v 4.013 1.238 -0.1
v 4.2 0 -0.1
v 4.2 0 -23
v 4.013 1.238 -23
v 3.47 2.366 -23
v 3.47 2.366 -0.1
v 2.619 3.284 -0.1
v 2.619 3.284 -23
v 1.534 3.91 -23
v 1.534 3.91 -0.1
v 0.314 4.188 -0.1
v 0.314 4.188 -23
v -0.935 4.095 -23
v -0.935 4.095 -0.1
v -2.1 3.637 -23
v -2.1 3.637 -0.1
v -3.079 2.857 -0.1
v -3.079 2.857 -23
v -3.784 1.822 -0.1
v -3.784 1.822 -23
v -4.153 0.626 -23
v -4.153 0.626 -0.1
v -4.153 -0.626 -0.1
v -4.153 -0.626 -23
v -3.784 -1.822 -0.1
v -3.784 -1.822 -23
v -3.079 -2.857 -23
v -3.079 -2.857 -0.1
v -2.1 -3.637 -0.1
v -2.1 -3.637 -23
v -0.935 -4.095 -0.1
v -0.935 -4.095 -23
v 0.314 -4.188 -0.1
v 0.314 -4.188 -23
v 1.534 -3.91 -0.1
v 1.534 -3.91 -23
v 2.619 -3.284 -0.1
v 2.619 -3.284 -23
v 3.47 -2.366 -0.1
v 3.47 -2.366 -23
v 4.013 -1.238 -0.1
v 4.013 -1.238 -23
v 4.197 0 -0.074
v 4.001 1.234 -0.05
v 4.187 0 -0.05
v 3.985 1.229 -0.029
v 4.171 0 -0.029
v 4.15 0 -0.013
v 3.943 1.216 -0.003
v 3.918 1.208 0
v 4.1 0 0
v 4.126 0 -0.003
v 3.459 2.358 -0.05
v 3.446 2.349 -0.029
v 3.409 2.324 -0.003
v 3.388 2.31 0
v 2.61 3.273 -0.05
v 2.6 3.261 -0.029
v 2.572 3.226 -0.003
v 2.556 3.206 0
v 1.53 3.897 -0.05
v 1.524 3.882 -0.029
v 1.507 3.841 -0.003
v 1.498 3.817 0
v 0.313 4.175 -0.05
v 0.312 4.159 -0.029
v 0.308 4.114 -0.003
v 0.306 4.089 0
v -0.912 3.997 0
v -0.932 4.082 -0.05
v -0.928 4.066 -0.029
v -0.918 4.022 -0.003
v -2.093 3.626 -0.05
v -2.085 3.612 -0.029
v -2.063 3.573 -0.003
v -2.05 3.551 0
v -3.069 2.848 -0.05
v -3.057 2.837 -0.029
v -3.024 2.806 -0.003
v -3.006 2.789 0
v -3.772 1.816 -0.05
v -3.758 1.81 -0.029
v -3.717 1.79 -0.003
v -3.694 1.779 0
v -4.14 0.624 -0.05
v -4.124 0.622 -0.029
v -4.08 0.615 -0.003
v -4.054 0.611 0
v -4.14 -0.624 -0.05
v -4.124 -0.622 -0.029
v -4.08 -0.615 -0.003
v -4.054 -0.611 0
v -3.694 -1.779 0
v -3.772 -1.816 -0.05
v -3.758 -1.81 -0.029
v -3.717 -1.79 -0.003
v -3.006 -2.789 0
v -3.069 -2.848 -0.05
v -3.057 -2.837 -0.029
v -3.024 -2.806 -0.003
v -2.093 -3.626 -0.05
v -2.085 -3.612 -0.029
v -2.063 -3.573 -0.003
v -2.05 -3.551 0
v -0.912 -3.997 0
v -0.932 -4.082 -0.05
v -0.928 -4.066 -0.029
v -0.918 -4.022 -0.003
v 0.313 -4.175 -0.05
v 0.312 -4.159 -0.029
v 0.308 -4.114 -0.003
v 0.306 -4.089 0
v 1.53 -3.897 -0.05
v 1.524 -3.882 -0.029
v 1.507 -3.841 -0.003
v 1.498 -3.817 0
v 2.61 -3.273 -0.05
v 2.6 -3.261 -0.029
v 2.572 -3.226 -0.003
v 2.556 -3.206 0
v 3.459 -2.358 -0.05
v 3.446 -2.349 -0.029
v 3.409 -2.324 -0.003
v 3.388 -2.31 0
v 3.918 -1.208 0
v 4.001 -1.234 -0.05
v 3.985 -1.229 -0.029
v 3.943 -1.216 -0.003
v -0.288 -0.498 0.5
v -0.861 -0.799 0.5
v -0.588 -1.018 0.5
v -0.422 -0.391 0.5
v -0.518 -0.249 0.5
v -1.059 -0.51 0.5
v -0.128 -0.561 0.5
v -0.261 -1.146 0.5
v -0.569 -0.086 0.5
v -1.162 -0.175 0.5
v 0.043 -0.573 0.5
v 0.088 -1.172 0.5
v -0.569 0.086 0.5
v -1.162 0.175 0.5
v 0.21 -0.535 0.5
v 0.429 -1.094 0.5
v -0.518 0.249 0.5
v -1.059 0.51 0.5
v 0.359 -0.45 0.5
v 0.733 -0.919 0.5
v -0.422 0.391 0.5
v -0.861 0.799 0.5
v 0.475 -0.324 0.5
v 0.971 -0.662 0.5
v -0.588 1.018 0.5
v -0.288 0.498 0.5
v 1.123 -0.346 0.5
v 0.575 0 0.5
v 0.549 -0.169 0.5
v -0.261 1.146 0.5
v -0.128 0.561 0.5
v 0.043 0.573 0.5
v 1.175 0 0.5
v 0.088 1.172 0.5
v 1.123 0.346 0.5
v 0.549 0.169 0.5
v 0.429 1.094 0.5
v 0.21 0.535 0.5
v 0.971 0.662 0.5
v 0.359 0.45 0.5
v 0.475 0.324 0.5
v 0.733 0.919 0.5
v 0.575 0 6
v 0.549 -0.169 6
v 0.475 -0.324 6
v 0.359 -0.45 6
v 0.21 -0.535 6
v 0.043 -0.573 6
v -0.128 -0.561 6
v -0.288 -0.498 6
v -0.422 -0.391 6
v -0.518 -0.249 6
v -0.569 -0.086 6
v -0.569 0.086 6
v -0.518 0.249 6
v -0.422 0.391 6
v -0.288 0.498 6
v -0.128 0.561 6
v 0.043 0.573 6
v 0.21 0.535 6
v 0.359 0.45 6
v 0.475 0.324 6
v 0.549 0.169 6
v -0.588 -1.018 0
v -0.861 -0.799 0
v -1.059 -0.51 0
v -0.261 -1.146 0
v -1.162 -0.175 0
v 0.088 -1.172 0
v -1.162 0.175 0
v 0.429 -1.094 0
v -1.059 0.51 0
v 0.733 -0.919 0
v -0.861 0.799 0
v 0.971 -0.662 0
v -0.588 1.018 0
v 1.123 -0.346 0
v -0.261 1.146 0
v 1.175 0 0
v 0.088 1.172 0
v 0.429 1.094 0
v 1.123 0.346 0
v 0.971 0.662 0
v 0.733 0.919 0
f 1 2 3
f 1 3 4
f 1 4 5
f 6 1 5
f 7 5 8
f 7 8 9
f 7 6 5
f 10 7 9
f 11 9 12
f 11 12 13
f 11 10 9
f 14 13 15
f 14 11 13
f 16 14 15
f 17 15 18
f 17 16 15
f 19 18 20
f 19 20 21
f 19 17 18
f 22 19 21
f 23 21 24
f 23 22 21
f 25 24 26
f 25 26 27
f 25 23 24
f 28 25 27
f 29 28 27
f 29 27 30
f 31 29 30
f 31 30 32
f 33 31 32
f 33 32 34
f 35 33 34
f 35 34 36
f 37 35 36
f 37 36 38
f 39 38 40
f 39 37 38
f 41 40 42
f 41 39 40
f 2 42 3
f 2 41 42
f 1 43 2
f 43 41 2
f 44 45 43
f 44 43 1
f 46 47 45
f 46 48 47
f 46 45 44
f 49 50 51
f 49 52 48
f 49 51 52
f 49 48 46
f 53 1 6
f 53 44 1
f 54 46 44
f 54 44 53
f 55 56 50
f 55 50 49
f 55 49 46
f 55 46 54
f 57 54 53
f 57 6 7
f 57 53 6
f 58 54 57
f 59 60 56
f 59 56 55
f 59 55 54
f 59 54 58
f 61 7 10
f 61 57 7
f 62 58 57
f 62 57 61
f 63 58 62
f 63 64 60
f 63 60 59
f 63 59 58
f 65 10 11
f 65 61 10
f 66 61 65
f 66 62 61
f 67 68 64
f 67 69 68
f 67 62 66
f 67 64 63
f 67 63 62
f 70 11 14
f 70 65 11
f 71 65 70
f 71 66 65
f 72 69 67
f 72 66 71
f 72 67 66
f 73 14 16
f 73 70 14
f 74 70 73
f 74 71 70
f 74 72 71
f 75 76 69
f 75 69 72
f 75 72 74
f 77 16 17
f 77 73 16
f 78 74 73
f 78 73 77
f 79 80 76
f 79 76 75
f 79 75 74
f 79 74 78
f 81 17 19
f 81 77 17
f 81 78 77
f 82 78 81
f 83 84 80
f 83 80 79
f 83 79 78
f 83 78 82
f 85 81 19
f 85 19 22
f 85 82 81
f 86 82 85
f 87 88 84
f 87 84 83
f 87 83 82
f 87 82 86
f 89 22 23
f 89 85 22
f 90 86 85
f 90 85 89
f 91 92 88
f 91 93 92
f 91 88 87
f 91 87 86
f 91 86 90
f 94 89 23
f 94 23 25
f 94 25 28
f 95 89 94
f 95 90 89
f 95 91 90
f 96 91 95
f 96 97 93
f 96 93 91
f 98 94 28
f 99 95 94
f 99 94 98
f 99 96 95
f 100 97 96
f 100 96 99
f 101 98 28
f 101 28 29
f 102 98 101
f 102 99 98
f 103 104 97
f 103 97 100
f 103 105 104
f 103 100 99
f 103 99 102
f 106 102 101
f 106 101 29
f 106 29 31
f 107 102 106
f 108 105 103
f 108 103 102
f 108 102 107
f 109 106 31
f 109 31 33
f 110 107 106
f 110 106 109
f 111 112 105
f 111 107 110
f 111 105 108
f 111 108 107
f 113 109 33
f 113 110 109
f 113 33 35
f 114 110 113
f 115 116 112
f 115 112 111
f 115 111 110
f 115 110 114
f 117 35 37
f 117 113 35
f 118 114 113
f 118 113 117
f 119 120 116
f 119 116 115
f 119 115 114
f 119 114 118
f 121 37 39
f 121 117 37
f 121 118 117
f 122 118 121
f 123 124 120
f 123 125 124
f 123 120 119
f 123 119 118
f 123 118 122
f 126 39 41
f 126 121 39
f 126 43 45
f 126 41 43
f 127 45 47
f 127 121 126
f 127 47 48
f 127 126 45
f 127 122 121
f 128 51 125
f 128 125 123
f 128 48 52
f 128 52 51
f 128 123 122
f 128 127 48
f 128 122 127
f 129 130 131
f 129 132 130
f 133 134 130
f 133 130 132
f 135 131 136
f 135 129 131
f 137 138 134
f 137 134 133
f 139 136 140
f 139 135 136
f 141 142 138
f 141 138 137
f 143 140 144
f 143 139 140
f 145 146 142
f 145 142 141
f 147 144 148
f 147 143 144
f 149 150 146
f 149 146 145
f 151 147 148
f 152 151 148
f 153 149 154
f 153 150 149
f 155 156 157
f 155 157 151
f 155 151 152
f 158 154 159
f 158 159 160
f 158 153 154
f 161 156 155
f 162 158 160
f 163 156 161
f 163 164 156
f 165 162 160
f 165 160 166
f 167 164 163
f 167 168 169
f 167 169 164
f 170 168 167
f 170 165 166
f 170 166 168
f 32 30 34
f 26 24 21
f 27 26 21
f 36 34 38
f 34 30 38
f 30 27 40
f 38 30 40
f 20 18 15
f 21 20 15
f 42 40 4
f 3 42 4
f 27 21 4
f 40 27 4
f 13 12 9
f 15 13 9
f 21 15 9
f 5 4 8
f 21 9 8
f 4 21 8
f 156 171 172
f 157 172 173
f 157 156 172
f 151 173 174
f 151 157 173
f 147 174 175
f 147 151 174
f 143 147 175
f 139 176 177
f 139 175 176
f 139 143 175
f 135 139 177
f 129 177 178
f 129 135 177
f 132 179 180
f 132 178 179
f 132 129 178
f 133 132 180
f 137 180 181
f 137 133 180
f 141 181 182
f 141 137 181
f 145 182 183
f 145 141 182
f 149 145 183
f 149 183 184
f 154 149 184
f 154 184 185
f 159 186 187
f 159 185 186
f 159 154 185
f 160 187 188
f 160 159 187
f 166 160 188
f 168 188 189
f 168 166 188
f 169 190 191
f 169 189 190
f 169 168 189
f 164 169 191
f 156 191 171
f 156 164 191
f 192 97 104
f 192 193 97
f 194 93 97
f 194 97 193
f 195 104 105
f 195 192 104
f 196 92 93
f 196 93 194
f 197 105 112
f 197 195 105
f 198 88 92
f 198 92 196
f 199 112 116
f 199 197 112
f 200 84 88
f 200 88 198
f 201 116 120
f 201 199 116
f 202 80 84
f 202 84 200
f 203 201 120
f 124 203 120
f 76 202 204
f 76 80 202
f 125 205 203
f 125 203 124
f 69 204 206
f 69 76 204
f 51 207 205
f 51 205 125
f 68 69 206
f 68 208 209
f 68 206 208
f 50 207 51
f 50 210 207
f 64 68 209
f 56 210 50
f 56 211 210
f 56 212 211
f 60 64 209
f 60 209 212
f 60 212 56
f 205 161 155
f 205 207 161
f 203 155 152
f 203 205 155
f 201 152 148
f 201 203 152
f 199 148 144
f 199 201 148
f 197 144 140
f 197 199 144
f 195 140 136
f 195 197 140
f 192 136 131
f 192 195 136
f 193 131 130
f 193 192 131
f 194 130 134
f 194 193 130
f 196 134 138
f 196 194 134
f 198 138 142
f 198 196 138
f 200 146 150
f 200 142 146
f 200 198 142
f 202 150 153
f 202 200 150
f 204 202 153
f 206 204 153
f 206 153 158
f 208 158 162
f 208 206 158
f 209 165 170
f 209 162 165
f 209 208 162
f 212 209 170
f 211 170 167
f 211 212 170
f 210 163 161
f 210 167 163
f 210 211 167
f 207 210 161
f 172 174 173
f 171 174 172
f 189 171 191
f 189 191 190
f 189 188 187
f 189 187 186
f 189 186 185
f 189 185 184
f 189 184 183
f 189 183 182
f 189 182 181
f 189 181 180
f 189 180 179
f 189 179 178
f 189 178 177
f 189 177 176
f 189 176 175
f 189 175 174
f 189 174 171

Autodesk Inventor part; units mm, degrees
ref_plane "YZ Plane" through (0, 0, 0) normal (1, 0, 0) x (0, 1, 0)
ref_plane "XZ Plane" through (0, 0, 0) normal (0, 1, 0) x (-1, 0, 0)
ref_plane "XY Plane" through (0, 0, 0) normal (0, 0, 1) x (1, 0, 0)
sketch "Esboço1" plane through (0, 0, 0) normal (0, 0, 1) x (1, 0, 0)
  circle A0 centre (0, 0) radius 4.2
  dimension "d0" = 8.4
extrude "Extrusão1" add sketch "Esboço1" against normal blind 23
sketch "Esboço2" plane through (0, 0, 0) normal (0, 0, 1) x (1, 0, 0)
  circle A0 centre (0, 0) radius 0.575
  dimension "d3" = 1.15
extrude "Extrusão2" add sketch "Esboço2" along normal blind 6
fillet "Arredondamento1" radius 0.1 1 edges at (-4.2, 0, 0)
sketch "Esboço3" plane through (0, 0, 0) normal (0, 0, 1) x (1, 0, 0)
  circle A0 centre (0, 0) radius 1.175
  dimension "d7" = 2.35
extrude "Extrusão3" add sketch "Esboço3" along normal blind 0.5
properties part number "coreless_8523" material "Alumínio 6061-AHC"
